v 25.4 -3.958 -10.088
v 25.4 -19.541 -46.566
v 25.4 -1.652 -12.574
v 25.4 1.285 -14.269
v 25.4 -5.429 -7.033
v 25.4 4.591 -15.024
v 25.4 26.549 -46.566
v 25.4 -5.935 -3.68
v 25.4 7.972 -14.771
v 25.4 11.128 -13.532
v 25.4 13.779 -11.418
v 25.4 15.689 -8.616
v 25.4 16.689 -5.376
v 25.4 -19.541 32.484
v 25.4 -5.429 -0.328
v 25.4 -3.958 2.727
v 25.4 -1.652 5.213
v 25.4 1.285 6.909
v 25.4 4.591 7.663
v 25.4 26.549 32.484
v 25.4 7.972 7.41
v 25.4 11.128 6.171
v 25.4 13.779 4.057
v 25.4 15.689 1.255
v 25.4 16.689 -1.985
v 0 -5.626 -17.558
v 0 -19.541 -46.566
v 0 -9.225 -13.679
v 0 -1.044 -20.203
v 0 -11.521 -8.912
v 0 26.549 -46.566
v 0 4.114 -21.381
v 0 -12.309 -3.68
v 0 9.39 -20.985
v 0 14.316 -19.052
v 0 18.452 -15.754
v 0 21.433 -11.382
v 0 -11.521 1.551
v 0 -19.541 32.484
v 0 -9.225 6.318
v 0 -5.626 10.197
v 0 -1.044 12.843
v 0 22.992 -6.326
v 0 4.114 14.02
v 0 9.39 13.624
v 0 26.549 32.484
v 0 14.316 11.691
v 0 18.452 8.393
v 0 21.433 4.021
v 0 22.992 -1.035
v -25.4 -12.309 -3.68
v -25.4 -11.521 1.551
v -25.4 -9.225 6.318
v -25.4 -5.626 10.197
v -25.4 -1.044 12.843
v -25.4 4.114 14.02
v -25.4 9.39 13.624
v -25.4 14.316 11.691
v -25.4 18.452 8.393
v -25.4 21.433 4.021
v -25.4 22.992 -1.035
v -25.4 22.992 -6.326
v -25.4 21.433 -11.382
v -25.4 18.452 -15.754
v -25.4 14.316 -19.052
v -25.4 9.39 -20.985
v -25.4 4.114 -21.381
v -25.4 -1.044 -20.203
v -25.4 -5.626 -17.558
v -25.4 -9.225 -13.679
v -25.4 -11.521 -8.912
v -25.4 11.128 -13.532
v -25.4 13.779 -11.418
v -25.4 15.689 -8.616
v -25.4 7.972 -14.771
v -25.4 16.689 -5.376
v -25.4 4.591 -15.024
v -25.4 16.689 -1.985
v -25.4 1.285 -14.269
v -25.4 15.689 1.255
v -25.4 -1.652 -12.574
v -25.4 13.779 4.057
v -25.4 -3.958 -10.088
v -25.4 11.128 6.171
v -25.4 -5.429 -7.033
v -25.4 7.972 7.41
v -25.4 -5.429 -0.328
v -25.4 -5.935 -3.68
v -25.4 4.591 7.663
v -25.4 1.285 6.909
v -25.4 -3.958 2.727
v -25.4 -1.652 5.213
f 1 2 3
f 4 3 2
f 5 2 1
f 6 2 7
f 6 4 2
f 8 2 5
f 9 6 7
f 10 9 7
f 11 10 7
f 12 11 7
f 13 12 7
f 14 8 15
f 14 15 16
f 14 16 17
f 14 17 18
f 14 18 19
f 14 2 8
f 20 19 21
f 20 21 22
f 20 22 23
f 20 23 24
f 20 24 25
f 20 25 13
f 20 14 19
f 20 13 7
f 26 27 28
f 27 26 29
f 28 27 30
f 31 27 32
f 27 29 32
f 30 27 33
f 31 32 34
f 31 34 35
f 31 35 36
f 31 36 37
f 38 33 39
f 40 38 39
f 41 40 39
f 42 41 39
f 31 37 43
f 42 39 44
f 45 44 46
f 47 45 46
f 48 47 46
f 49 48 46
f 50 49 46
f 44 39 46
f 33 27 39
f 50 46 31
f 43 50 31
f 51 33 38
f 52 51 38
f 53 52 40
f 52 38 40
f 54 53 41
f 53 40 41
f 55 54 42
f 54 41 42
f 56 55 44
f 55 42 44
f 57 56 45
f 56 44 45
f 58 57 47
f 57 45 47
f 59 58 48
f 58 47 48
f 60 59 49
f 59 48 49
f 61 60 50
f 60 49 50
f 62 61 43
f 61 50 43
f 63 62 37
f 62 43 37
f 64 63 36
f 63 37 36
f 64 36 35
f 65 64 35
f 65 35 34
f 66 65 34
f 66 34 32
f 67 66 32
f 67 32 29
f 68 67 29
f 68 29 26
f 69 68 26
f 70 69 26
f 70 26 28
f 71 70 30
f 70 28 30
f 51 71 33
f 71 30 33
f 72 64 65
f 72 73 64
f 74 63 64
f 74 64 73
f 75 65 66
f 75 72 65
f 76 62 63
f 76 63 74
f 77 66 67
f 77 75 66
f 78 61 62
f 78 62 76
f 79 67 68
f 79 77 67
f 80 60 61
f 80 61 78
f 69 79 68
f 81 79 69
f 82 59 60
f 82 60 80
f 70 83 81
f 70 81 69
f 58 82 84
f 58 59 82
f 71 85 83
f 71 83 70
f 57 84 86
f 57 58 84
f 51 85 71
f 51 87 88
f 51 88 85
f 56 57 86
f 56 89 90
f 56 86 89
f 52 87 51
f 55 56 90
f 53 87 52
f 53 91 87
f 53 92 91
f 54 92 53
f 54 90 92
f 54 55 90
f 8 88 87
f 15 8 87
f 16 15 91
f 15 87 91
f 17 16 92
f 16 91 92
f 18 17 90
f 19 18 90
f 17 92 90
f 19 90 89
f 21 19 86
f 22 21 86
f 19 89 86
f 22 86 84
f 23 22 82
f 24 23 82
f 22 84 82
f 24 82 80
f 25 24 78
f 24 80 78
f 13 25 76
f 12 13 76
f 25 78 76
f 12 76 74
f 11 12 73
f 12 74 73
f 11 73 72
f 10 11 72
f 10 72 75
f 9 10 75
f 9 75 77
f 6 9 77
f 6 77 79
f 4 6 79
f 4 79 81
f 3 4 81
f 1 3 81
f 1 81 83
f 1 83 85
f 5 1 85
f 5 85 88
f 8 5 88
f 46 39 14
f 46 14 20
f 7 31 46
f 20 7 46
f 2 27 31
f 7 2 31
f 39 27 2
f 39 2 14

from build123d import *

# Parameters (mm, degrees)
F0_W     = 46.089629
F0_H     = 79.049881
F1_DEPTH = 25.4
F2_R     = 17.749963
F3_DEPTH = 25.4
F4_R     = 11.375328
F5_DEPTH = 50.801


with BuildPart() as f1:
    # F0 (on Right) → F1 (new body)
    with BuildSketch(Plane.YZ):
        with Locations((3.503773, -7.040882)):
            Rectangle(F0_W, F0_H)
    extrude(amount=F1_DEPTH)

    # F2 (on face) → F3 (join)
    with BuildSketch(Plane(origin=(0, 0, 0), x_dir=(0, -1, 0), z_dir=(-1, 0, 0))):
        with Locations((-5.44068, -3.68046)):
            Circle(F2_R)
    extrude(amount=F3_DEPTH)

    # F4 (on face) → F5 (cut, through all)
    with BuildSketch(Plane(origin=(-25.4, 0, 0), x_dir=(0, -1, 0), z_dir=(-1, 0, 0))):
        with Locations((-5.44068, -3.68046)):
            Circle(F4_R)
    extrude(amount=-F5_DEPTH, mode=Mode.SUBTRACT)


solid = f1.part
